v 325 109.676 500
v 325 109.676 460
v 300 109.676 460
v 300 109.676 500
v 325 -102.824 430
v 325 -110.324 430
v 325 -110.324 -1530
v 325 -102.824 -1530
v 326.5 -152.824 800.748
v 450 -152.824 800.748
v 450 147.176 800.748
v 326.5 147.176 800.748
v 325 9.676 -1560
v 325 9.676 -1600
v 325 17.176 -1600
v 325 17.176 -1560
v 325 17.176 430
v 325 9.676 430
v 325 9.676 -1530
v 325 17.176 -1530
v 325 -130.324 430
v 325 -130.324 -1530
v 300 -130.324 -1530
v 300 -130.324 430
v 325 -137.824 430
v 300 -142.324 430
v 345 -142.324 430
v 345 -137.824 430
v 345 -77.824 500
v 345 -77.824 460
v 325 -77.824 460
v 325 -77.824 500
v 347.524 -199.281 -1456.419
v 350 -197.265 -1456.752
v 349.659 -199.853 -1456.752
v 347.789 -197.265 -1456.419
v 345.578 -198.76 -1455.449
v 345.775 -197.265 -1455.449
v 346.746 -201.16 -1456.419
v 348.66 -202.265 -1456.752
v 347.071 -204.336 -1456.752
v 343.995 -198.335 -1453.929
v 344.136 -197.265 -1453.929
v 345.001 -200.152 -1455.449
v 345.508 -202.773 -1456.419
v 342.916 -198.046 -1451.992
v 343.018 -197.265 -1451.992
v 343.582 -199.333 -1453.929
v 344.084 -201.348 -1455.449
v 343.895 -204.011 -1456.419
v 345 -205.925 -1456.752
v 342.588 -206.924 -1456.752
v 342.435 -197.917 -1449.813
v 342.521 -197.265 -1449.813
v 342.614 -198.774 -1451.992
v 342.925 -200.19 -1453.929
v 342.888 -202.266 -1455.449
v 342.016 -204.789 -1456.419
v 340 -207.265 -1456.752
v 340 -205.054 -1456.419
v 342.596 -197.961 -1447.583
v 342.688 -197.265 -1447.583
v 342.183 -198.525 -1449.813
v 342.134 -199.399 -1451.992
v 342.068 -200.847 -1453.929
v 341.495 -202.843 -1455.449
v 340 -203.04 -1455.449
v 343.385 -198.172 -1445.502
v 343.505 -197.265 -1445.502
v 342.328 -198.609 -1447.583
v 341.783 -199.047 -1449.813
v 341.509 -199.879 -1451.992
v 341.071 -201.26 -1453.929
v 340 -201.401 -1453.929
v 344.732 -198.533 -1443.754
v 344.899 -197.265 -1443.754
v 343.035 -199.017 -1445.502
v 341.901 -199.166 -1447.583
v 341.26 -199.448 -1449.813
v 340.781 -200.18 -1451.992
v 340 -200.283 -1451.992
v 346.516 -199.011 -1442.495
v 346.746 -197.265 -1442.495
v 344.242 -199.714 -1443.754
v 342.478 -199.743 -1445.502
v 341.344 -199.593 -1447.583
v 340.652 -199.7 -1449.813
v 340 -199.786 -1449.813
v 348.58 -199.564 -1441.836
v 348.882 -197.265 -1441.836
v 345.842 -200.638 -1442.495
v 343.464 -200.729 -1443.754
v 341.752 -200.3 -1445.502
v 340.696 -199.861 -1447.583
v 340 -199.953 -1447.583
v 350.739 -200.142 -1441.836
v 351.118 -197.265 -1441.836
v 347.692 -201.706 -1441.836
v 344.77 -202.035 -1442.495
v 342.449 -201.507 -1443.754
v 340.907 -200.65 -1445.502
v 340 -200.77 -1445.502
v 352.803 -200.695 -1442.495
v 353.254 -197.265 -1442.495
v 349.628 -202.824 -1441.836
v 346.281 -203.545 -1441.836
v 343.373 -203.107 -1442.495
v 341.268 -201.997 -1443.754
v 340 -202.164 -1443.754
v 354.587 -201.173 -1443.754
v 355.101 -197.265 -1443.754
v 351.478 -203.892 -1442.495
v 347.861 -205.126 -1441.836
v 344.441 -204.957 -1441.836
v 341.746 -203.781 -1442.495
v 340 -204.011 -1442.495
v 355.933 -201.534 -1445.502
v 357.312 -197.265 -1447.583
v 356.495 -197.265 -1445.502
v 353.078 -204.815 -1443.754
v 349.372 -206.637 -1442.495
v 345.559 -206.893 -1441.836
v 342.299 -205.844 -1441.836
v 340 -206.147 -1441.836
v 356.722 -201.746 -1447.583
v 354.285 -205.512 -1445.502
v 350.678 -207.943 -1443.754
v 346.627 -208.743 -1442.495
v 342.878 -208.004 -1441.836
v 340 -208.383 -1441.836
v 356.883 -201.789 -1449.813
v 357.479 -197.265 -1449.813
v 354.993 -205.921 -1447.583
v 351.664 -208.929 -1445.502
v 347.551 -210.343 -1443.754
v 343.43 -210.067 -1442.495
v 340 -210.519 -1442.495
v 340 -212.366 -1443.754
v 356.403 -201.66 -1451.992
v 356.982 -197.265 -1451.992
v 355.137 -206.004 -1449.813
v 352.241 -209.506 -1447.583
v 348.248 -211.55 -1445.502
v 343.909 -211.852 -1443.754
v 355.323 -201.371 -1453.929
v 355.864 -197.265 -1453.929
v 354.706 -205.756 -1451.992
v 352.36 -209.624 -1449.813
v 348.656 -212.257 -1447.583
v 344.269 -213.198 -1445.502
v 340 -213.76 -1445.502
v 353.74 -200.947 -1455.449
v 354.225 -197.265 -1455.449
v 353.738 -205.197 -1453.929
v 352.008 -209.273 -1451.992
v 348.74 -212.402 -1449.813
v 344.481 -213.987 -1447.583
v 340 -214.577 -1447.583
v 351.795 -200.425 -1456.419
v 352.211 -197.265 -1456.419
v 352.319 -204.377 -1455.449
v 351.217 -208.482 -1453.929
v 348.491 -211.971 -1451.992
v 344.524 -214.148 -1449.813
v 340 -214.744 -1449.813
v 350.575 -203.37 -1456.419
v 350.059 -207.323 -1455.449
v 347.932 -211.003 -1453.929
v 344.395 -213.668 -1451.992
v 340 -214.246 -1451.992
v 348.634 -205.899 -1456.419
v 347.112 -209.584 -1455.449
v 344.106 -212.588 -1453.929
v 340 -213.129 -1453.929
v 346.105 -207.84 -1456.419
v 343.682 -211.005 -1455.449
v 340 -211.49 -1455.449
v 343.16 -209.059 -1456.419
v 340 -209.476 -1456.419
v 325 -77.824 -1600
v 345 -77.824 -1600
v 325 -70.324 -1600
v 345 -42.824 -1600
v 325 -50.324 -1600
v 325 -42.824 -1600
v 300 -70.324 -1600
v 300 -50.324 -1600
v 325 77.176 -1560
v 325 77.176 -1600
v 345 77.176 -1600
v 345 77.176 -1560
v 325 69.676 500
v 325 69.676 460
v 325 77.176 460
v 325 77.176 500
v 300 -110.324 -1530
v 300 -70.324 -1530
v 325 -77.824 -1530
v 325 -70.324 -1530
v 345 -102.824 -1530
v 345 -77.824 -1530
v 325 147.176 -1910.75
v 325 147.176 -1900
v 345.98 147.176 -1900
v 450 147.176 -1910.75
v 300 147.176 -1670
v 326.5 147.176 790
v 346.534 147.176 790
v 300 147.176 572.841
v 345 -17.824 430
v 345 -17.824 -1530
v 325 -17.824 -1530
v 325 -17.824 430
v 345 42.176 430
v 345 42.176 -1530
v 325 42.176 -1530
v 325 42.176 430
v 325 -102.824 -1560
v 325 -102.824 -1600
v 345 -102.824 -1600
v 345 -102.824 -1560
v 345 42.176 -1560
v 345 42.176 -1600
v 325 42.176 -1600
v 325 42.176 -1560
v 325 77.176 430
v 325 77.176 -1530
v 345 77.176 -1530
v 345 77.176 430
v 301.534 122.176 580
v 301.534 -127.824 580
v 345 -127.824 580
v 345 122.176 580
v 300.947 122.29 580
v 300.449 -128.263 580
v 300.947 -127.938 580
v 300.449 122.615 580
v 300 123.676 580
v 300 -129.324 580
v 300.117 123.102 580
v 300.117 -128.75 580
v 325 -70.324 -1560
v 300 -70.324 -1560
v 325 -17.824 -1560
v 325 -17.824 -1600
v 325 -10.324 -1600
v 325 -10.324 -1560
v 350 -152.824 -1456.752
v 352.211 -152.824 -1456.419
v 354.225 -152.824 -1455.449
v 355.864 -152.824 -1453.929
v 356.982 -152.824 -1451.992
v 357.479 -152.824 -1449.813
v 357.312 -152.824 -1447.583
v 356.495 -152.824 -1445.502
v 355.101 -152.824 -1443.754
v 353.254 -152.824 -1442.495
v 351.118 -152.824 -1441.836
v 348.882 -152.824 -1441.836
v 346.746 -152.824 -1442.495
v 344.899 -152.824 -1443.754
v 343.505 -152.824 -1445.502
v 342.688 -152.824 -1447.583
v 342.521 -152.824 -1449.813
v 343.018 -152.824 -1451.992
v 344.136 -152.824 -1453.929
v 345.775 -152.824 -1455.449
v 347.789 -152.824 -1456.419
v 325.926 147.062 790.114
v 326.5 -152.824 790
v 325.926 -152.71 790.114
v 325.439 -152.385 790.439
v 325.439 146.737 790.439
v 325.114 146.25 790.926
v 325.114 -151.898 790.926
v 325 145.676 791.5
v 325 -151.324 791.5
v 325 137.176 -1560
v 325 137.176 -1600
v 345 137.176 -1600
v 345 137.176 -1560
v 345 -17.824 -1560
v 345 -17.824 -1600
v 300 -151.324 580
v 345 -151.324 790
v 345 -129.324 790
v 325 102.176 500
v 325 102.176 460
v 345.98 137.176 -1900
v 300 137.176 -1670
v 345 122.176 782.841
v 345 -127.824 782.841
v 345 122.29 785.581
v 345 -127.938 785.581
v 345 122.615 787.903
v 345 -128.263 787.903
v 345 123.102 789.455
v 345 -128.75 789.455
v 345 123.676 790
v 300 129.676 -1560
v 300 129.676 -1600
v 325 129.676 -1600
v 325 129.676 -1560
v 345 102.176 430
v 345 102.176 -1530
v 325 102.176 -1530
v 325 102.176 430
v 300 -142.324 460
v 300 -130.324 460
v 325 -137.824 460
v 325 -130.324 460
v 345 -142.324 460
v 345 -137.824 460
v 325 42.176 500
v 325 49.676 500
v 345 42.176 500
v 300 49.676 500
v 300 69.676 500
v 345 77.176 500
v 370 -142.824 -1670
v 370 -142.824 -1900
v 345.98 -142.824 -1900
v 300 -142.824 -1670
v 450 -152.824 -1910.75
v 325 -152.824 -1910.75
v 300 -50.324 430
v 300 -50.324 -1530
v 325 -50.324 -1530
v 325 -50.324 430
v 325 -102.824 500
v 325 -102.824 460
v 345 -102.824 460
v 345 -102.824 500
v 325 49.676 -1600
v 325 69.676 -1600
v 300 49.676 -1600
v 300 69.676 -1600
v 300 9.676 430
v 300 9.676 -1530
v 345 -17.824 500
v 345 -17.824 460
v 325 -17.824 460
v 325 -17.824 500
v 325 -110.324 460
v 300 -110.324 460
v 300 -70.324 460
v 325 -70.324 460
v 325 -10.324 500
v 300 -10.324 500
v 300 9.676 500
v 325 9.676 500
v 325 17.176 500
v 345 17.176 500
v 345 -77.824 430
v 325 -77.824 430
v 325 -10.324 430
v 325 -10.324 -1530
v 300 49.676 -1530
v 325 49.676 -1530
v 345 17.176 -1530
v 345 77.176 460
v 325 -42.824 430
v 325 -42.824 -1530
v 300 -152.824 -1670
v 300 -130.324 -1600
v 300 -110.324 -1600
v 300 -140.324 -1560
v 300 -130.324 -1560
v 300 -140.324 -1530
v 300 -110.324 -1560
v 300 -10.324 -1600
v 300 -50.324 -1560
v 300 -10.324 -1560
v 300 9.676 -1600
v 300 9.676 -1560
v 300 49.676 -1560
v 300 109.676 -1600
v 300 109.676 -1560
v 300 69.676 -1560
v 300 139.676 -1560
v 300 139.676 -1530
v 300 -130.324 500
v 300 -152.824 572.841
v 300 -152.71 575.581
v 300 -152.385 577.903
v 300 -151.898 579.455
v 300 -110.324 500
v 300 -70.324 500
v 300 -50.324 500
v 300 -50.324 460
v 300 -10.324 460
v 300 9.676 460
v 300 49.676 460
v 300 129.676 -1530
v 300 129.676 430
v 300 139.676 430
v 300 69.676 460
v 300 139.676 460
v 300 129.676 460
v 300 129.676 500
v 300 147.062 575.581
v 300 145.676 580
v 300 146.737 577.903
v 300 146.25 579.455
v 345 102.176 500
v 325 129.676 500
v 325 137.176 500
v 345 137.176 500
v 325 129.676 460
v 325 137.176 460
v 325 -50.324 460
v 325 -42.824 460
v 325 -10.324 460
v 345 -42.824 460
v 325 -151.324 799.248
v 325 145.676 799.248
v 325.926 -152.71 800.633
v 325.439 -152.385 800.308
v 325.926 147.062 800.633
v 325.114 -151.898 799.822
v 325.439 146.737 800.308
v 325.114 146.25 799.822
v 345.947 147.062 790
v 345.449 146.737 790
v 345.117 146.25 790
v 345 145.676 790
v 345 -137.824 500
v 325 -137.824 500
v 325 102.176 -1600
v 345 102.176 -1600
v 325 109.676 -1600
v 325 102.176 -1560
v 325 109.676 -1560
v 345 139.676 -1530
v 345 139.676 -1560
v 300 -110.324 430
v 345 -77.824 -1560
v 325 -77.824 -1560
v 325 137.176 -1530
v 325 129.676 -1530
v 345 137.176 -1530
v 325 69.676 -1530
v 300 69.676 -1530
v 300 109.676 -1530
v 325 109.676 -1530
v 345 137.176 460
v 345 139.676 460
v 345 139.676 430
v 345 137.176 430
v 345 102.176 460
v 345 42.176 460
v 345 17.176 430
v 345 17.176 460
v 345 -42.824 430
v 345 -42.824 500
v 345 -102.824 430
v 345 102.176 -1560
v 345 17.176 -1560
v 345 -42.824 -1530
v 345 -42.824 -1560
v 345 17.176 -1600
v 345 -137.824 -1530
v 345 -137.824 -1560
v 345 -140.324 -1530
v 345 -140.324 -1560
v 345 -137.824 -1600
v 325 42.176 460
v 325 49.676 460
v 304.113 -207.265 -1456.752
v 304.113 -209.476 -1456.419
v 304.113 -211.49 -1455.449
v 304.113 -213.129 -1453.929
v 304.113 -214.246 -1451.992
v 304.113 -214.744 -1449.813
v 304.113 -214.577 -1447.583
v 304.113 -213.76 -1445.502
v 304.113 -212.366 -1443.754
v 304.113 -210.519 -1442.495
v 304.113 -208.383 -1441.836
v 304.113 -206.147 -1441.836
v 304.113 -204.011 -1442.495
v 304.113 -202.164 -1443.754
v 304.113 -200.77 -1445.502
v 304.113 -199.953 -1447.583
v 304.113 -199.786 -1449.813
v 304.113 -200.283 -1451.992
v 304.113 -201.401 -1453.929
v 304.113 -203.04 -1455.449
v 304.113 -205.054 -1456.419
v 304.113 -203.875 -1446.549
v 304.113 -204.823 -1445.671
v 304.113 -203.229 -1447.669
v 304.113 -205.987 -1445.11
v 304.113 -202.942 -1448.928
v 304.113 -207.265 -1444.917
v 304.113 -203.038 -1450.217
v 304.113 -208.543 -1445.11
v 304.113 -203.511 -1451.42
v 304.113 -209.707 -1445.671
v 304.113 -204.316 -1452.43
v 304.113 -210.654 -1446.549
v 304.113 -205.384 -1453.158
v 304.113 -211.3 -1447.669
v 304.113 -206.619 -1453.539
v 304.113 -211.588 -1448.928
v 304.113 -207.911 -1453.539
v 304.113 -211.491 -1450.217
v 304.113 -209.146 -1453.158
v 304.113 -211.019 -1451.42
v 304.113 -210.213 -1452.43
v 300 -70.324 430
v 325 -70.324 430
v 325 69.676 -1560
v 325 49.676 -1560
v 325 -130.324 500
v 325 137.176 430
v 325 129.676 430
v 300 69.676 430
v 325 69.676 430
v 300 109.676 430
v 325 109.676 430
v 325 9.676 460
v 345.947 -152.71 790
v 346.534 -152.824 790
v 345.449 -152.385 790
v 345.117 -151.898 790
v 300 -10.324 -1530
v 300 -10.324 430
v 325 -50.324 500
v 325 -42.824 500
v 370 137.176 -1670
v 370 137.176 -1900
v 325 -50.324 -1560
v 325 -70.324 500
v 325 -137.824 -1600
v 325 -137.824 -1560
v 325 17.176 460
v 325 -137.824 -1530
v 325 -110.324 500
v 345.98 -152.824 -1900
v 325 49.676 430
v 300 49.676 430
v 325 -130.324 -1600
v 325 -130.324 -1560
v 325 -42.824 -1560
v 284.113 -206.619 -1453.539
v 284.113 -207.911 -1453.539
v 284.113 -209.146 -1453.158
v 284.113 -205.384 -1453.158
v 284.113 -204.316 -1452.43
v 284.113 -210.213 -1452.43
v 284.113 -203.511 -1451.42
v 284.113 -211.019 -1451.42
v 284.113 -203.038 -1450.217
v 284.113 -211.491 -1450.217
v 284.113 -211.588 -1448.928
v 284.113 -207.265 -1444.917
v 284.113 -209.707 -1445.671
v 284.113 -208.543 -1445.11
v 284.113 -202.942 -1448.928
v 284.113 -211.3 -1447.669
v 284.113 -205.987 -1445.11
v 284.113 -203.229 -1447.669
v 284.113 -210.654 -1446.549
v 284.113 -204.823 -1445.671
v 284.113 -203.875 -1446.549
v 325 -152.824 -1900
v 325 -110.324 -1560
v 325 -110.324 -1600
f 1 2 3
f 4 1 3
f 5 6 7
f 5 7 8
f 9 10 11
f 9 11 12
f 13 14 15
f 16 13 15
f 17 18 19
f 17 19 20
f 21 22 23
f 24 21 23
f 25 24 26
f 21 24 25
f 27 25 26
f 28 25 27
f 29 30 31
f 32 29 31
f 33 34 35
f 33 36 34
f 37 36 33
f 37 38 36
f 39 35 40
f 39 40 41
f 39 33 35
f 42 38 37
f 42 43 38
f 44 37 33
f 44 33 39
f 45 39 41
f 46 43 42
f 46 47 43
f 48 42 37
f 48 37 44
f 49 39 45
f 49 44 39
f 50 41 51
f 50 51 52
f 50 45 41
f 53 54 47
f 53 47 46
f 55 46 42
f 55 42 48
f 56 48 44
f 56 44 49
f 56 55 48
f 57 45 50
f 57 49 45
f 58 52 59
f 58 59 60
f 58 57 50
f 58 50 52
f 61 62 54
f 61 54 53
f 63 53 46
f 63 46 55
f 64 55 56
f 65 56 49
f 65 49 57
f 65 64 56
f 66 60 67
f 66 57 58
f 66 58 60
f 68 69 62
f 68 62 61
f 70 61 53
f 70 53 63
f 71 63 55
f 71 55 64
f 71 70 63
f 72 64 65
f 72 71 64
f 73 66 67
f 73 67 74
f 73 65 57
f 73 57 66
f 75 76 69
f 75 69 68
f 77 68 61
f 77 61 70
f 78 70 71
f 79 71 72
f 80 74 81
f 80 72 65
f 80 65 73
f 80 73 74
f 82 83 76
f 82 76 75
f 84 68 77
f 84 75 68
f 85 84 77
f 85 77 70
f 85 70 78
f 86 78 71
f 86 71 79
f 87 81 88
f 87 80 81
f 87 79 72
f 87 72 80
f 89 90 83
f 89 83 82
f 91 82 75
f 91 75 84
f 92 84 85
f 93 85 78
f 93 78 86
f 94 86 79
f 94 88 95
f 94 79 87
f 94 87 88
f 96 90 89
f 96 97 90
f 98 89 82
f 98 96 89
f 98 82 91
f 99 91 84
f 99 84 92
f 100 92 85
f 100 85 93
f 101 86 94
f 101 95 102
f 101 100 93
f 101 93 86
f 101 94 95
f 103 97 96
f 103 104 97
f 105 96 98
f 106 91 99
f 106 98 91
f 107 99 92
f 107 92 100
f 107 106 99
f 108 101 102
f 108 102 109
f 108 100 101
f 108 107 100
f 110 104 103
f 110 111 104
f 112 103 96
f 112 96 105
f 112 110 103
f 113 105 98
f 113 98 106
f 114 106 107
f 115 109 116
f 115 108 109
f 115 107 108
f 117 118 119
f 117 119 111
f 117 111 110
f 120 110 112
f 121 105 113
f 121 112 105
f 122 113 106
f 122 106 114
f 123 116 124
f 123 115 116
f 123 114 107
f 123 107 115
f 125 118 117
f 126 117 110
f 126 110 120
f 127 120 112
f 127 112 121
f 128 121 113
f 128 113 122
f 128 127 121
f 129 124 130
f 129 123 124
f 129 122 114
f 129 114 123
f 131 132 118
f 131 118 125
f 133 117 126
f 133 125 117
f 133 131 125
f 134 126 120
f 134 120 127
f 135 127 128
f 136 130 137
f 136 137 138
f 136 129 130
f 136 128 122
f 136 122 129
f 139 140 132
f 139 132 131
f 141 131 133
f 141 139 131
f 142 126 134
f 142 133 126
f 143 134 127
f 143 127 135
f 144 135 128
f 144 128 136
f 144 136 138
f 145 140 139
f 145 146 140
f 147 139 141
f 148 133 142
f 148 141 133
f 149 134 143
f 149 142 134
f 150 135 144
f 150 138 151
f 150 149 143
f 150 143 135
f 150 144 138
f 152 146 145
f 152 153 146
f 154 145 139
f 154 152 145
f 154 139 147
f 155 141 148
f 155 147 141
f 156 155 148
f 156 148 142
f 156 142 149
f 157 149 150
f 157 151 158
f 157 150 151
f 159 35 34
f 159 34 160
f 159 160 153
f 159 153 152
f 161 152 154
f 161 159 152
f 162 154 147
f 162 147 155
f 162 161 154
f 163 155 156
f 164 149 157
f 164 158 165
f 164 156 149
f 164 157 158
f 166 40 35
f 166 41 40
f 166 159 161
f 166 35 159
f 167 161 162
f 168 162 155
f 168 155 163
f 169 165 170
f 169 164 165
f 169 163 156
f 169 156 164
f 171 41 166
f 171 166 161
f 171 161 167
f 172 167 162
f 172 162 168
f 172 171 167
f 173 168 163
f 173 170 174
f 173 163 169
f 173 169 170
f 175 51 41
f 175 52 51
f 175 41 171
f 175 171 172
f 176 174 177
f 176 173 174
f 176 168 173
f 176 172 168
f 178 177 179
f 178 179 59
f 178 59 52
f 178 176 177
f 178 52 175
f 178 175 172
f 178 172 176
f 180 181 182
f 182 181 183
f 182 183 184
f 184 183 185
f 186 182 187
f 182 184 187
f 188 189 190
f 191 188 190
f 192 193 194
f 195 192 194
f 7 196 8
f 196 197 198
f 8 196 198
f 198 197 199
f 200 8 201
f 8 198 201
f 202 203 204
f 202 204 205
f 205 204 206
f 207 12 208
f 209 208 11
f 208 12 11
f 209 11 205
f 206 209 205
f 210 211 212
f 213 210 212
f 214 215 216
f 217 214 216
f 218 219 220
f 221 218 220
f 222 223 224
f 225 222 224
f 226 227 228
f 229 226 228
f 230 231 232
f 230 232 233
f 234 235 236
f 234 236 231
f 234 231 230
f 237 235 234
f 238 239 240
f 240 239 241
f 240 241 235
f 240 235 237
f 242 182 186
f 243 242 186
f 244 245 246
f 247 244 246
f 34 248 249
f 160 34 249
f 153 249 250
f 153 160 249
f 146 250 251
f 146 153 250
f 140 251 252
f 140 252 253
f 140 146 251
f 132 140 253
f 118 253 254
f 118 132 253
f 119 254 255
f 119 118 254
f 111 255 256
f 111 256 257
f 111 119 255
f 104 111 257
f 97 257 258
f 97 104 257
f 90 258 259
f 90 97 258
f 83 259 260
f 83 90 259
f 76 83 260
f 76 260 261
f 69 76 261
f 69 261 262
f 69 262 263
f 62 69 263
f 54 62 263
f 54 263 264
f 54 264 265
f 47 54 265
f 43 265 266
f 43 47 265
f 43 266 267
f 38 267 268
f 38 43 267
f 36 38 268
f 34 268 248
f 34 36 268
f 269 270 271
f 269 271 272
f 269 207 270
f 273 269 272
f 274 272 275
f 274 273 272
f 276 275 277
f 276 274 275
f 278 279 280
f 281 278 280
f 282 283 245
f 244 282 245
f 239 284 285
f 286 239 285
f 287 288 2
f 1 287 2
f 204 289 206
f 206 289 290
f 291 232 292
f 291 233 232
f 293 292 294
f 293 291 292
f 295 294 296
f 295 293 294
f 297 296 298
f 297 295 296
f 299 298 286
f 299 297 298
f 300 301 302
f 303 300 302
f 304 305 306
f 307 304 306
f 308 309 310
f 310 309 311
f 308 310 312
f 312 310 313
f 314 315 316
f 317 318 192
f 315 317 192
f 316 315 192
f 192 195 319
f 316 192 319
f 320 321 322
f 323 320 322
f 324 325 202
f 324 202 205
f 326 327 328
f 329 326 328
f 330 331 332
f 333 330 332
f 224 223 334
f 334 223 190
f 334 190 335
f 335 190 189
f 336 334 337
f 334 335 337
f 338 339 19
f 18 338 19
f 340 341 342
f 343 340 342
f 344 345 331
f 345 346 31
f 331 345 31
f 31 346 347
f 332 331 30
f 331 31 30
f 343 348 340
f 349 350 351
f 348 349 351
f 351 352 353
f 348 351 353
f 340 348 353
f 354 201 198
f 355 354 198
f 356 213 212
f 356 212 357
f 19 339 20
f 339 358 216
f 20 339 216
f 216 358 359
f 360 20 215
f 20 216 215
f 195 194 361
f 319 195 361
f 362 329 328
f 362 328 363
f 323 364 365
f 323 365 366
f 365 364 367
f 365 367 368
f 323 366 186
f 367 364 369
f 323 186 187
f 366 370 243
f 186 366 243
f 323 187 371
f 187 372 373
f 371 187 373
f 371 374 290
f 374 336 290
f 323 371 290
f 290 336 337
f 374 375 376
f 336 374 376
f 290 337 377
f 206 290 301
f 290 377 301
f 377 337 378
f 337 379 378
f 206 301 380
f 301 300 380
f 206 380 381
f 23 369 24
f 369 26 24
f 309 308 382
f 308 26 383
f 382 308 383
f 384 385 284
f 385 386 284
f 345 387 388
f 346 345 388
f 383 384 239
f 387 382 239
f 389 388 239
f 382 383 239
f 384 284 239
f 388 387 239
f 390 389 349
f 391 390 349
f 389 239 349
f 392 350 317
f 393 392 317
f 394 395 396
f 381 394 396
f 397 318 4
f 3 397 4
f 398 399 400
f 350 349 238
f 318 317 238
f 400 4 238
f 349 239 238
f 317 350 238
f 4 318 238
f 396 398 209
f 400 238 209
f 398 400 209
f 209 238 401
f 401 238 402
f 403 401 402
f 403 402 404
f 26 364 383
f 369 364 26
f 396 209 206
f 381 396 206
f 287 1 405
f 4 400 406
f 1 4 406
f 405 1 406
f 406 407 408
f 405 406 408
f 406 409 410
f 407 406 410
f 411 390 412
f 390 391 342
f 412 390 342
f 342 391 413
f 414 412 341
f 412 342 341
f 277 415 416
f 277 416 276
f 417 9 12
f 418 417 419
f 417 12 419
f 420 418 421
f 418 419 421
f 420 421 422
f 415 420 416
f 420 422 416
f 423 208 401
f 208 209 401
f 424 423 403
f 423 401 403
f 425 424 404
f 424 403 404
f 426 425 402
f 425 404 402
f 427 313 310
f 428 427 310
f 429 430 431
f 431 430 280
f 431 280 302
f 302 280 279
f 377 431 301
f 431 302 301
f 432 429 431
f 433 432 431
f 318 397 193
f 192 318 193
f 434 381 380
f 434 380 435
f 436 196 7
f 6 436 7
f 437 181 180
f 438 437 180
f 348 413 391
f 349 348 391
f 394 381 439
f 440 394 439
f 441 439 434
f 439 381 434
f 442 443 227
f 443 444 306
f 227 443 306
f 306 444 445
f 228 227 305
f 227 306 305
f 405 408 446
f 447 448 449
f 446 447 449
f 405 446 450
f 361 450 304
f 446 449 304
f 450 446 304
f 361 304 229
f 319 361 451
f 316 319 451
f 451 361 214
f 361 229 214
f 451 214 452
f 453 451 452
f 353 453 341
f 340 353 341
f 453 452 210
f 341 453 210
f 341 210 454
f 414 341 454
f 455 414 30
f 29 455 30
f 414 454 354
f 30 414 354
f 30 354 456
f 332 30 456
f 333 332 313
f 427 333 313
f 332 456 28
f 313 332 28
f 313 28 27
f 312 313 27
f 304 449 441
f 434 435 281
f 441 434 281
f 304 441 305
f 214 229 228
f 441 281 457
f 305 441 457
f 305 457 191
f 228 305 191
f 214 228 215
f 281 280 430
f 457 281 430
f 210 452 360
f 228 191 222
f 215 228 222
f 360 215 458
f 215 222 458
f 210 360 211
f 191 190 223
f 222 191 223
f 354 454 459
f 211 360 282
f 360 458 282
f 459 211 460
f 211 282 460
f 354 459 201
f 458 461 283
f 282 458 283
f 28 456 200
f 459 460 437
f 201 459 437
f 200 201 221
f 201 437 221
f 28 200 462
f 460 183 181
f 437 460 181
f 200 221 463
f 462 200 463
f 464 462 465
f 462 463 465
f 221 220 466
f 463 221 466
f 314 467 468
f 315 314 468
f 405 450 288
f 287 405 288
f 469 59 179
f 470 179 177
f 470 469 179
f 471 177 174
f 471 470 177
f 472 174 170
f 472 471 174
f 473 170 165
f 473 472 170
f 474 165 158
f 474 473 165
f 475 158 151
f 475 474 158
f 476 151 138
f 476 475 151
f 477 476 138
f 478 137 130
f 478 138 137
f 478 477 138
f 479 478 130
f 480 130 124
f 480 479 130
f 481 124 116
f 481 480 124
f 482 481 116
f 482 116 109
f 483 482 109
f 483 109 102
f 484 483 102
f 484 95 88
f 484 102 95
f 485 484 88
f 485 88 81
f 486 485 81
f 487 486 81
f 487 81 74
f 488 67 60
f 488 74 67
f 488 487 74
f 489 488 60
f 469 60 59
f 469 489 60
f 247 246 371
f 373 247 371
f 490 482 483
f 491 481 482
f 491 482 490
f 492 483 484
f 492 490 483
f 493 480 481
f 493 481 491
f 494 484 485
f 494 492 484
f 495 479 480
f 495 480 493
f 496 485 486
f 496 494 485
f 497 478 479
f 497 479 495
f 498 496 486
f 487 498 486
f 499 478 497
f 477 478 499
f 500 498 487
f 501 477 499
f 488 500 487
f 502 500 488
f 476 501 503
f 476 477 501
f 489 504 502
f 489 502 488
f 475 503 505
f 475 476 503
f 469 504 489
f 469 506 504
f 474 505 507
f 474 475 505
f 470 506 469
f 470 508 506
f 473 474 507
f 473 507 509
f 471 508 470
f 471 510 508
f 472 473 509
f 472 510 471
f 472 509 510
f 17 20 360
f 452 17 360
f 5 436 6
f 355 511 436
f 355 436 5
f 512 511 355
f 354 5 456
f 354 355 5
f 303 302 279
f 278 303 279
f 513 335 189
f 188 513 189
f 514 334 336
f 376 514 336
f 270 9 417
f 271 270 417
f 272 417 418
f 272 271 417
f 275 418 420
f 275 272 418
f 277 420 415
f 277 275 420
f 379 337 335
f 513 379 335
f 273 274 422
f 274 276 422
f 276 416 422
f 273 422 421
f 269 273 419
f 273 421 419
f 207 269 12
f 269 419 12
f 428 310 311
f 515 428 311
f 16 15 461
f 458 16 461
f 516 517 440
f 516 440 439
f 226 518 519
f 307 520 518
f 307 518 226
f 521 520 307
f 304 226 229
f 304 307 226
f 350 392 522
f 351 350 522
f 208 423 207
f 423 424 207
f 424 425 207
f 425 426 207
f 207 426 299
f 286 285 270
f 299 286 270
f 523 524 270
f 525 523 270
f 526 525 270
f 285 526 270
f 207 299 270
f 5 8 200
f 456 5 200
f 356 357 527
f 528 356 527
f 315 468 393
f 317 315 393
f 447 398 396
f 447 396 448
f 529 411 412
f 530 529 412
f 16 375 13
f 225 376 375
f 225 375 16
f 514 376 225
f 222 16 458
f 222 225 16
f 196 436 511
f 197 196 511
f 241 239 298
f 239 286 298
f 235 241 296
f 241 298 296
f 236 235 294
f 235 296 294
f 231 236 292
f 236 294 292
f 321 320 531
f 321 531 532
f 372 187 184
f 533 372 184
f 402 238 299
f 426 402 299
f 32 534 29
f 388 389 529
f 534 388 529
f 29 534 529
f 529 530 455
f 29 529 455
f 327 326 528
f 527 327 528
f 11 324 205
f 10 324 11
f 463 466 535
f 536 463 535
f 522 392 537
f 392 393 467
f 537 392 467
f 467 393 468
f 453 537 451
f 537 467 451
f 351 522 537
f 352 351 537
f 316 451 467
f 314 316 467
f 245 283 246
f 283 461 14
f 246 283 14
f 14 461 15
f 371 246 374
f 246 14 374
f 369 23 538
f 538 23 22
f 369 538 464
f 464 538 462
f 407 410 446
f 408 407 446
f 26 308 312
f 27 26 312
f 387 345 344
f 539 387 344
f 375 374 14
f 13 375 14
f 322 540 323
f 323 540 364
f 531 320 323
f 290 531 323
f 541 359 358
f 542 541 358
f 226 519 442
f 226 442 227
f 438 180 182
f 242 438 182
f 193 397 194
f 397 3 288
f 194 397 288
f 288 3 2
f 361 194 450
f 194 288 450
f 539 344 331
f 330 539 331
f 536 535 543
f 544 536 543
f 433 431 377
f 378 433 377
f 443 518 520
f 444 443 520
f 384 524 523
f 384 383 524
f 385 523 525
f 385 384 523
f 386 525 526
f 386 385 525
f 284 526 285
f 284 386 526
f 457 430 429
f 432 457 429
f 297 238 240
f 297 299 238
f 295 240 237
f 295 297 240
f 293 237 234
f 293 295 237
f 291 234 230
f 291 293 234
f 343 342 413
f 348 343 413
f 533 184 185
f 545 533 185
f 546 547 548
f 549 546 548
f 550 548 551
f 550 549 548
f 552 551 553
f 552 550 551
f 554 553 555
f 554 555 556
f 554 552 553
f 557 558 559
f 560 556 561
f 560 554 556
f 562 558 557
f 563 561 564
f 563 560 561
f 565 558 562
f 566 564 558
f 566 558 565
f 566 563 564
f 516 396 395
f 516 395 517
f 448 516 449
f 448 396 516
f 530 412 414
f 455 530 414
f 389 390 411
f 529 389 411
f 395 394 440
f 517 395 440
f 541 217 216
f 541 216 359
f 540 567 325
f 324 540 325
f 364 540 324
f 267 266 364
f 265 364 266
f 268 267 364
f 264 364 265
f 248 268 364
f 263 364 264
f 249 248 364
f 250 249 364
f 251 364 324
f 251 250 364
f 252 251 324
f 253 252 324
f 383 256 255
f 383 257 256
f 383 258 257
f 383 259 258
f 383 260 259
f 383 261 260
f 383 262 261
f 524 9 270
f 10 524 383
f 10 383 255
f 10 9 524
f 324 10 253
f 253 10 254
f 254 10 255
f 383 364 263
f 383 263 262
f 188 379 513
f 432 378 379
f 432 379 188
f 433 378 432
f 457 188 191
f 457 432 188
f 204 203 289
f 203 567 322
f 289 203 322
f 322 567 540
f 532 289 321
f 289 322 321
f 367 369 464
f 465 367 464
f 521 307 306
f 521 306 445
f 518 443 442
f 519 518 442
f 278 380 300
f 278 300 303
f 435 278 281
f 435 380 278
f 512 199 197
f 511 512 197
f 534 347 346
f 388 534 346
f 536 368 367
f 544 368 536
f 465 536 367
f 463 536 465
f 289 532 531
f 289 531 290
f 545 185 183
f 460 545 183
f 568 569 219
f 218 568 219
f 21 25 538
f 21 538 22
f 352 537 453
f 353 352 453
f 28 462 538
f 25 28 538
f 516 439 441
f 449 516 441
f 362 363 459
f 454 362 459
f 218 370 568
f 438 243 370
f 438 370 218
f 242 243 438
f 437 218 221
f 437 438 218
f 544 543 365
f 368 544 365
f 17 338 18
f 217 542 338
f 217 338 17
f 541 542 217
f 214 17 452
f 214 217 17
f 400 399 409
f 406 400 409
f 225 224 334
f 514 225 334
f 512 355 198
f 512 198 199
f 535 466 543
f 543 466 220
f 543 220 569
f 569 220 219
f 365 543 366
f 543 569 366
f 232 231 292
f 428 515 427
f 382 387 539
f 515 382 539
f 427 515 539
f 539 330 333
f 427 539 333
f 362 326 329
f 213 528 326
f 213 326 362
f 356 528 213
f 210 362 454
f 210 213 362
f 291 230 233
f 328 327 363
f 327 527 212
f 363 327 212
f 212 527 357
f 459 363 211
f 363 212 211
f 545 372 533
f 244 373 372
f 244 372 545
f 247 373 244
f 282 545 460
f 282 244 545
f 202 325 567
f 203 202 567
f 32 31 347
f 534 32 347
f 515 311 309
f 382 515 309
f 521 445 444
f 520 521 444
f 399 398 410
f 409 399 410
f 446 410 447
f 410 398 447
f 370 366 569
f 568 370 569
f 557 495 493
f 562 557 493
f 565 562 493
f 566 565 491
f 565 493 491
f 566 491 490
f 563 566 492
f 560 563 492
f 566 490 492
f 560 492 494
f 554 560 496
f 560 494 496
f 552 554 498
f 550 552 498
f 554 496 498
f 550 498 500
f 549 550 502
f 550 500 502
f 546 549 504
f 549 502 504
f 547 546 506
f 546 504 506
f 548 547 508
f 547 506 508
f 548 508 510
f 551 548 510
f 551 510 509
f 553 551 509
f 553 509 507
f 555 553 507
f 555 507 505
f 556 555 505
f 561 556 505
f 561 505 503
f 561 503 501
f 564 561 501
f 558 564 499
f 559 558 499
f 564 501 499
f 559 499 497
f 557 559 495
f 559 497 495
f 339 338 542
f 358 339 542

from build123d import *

# Parameters (mm, degrees)
BOSS_EXTRUDE1_DEPTH      = 500
BOSS_EXTRUDE1_DEPTH_BACK = 1600
SKETCH1_W                = 150
SKETCH1_H                = 300
CUT_EXTRUDE1_DEPTH       = 2309
SKETCH5_W                = 150
SKETCH5_H                = 300
BOSS_EXTRUDE2_DEPTH      = 350
SKETCH6_W                = 210
SKETCH6_H                = 250
CUT_EXTRUDE4_DEPTH       = 45
CUT_EXTRUDE5_DEPTH       = 1500
CUT_EXTRUDE7_DEPTH       = 355
FILLET8_R                = 1.5
FILLET9_R                = 1.5
SKETCH9_W                = 150
SKETCH9_H                = 300
BOSS_EXTRUDE3_DEPTH      = 300
SKETCH10_W               = 70
SKETCH10_H               = 230
CUT_EXTRUDE17_DEPTH      = 140
SKETCH11_W               = 125
SKETCH11_H               = 10.75
BOSS_EXTRUDE4_DEPTH      = 300
CUT_EXTRUDE18_DEPTH      = 394
SWEEP1_PROFILE_R         = 7.5
SKETCH50_R               = 4.335134875
BOSS_EXTRUDE5_DEPTH      = 20
CUT_EXTRUDE19_DEPTH      = 30
CUT_EXTRUDE19_DEPTH_BACK = 250
SKETCH82_W               = 45
SKETCH82_H               = 30
CUT_EXTRUDE20_DEPTH      = 32
CUT_EXTRUDE20_DEPTH_BACK = 250
SKETCH85_W               = 45
SKETCH85_H               = 30


with BuildPart() as part:
    # Sketch1 → Boss-Extrude1 (new, two sides: drawn at the far end of the back side and taken through both)
    with BuildSketch(Plane.XY.offset(-BOSS_EXTRUDE1_DEPTH_BACK)):
        with Locations((375, -2.824081205)):
            Rectangle(SKETCH1_W, SKETCH1_H)
    extrude(amount=BOSS_EXTRUDE1_DEPTH + BOSS_EXTRUDE1_DEPTH_BACK)

    # Sketch2 → Cut-Extrude1 (cut)
    with BuildSketch(Plane(origin=(0, 0, -1600), x_dir=(-1, 0, 0), z_dir=(0, 0, -1))):
        Polygon((-300, 49.675918795), (-300, 69.675918795), (-325, 69.675918795), (-325, 77.175918795), (-345, 77.175918795), (-345, 42.175918795), (-325, 42.175918795), (-325, 49.675918795), align=None)
        Polygon((-300, 129.675918795), (-325, 129.675918795), (-325, 137.175918795), (-345, 137.175918795), (-345, 102.175918795), (-325, 102.175918795), (-325, 109.675918795), (-300, 109.675918795), align=None)
        Polygon((-300, -10.324081205), (-300, 9.675918795), (-325, 9.675918795), (-325, 17.175918795), (-345, 17.175918795), (-345, -17.824081205), (-325, -17.824081205), (-325, -10.324081205), align=None)
        Polygon((-300, -70.324081205), (-300, -50.324081205), (-325, -50.324081205), (-325, -42.824081205), (-345, -42.824081205), (-345, -77.824081205), (-325, -77.824081205), (-325, -70.324081205), align=None)
        Polygon((-300, -130.324081205), (-300, -110.324081205), (-325, -110.324081205), (-325, -102.824081205), (-345, -102.824081205), (-345, -137.824081205), (-325, -137.824081205), (-325, -130.324081205), align=None)
    extrude(amount=-CUT_EXTRUDE1_DEPTH, mode=Mode.SUBTRACT)

    # Sketch5 → Boss-Extrude2 (add)
    with BuildSketch(Plane.XY.offset(500)):
        with Locations((375, -2.824081205)):
            Rectangle(SKETCH5_W, SKETCH5_H)
    extrude(amount=BOSS_EXTRUDE2_DEPTH)

    # Sketch6 → Cut-Extrude4 (cut)
    with BuildSketch(Plane.ZY.offset(-300)):
        with Locations((685, -2.824081205)):
            Rectangle(SKETCH6_W, SKETCH6_H)
    extrude(amount=-CUT_EXTRUDE4_DEPTH, mode=Mode.SUBTRACT)

    # Sketch7 → Cut-Extrude5 (cut, symmetric)
    with BuildSketch(Plane.XZ.offset(-122.175918795)):
        Polygon((300, 580), (345, 790), (300, 790), align=None)
    extrude(amount=CUT_EXTRUDE5_DEPTH, both=True, mode=Mode.SUBTRACT)

    # Sketch8 → Cut-Extrude7 (cut)
    with BuildSketch(Plane.XZ.offset(152.824081205)):
        Polygon((450, 850), (450, 800.747642435), (325, 800.747642435), (325, 790), (300, 790), (300, 850), align=None)
    extrude(amount=-CUT_EXTRUDE7_DEPTH, mode=Mode.SUBTRACT)

    # Fillet8
    fillet8_edges = [part.edges().sort_by_distance(p)[0] for p in [
        (325, -2.824081205, 790),
        (325, 147.175918795, 795.373821218),
        (325, -2.824081205, 800.747642435),
        (325, -152.824081205, 795.373821218),
    ]]
    fillet(fillet8_edges, radius=FILLET8_R)

    # Fillet9
    fillet9_edges = [part.edges().sort_by_distance(p)[0] for p in [
        (322.5, -152.824081205, 685),
        (322.5, 147.175918795, 685),
        (322.5, 122.175918795, 685),
        (322.5, -127.824081205, 685),
    ]]
    fillet(fillet9_edges, radius=FILLET9_R)

    # Sketch9 → Boss-Extrude3 (add)
    with BuildSketch(Plane(origin=(0, 0, -1600), x_dir=(-1, 0, 0), z_dir=(0, 0, -1))):
        with Locations((-375, -2.824081205)):
            Rectangle(SKETCH9_W, SKETCH9_H)
    extrude(amount=BOSS_EXTRUDE3_DEPTH)

    # Sketch10 → Cut-Extrude17 (cut, symmetric)
    with BuildSketch(Plane(origin=(0, -2.824081205, 0), x_dir=(-1, 0, 0), z_dir=(0, -1, 0))):
        with Locations((-335, 1785)):
            Rectangle(SKETCH10_W, SKETCH10_H)
    extrude(amount=CUT_EXTRUDE17_DEPTH, both=True, mode=Mode.SUBTRACT)

    # Sketch11 → Boss-Extrude4 (add)
    with BuildSketch(Plane.XZ.offset(152.824081205)):
        with Locations((387.5, -1905.375)):
            Rectangle(SKETCH11_W, SKETCH11_H)
    extrude(amount=-BOSS_EXTRUDE4_DEPTH)

    # Sketch13 → Cut-Extrude18 (cut)
    with BuildSketch(Plane.XZ.offset(152.824081205)):
        Polygon((300, -1900), (345.980080602, -1900), (300, -1670), align=None)
    extrude(amount=-CUT_EXTRUDE18_DEPTH, mode=Mode.SUBTRACT)

    # Sweep1: sweep along a path in Sketch15
    with BuildLine(Plane.XY.offset(-1449.252357565)) as sweep1_path:
        Line((350, -145.902648046), (350, -197.264838167))
        ThreePointArc((350, -197.264838167), (347.071067812, -204.335905979), (340, -207.264838167))
        Line((340, -207.264838167), (304.112930958, -207.264838167))
    # Sweep1 profile (on start of the path) → Sweep1 (sweep)
    with BuildSketch(Plane(origin=(350, -145.902648046, -1449.252357565), x_dir=(0, 0, -1), z_dir=(0, -1, 0))):
        Circle(SWEEP1_PROFILE_R)
    sweep(path=sweep1_path.line)

    # Sketch50 → Boss-Extrude5 (add)
    with BuildSketch(Plane.ZY.offset(-304.112930958)):
        with Locations((-1449.252357565, -207.264838167)):
            Circle(SKETCH50_R)
    extrude(amount=BOSS_EXTRUDE5_DEPTH)

    # Sketch82 → Cut-Extrude19 (cut, two sides: drawn at the far end of the back side and taken through both)
    with BuildSketch(Plane.XZ.offset(110.324081205).offset(-CUT_EXTRUDE19_DEPTH_BACK)):
        with Locations((322.5, -1545)):
            Rectangle(SKETCH82_W, SKETCH82_H)
    extrude(amount=CUT_EXTRUDE19_DEPTH + CUT_EXTRUDE19_DEPTH_BACK, mode=Mode.SUBTRACT)

    # Sketch85 → Cut-Extrude20 (cut, two sides: drawn at the far end of the back side and taken through both)
    with BuildSketch(Plane.XZ.offset(110.324081205).offset(-CUT_EXTRUDE20_DEPTH_BACK)):
        with Locations((322.5, 445)):
            Rectangle(SKETCH85_W, SKETCH85_H)
    extrude(amount=CUT_EXTRUDE20_DEPTH + CUT_EXTRUDE20_DEPTH_BACK, mode=Mode.SUBTRACT)


solid = part.part
